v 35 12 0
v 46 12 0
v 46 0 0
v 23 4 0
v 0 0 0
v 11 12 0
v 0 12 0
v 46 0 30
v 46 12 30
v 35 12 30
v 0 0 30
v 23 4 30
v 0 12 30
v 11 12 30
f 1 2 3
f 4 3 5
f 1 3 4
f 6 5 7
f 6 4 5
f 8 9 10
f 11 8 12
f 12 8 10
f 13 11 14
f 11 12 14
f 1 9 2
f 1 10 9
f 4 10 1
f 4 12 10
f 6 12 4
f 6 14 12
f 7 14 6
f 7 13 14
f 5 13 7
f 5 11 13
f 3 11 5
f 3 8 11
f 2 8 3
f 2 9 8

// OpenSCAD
$fn = 32;

// ----------------------------------------------------------------------
// V guide rail: vway, 46 mm wide
// ----------------------------------------------------------------------

// --- parameters (mm) ---
rail_w = 46;              // rail width, X
base_t = 12;              // base plate thickness
v_depth = 8;              // V feature depth / height
v_half_w = 12;            // half width of the V at the base face
plate_t = 30;             // rail length, Z (the extrusion height)
fit_tol = 0.05;           // declared fit tolerance (prompt contract)
free_tol = 0.3;           // declared free tolerance (prompt contract)

profile = [[0, 0], [46, 0], [46, 12], [35, 12], [23, 4], [11, 12], [0, 12]];  // primary outline, 7 points, counter clockwise

// --- the one profile operation ---
linear_extrude(height = plate_t) polygon(points = profile);
